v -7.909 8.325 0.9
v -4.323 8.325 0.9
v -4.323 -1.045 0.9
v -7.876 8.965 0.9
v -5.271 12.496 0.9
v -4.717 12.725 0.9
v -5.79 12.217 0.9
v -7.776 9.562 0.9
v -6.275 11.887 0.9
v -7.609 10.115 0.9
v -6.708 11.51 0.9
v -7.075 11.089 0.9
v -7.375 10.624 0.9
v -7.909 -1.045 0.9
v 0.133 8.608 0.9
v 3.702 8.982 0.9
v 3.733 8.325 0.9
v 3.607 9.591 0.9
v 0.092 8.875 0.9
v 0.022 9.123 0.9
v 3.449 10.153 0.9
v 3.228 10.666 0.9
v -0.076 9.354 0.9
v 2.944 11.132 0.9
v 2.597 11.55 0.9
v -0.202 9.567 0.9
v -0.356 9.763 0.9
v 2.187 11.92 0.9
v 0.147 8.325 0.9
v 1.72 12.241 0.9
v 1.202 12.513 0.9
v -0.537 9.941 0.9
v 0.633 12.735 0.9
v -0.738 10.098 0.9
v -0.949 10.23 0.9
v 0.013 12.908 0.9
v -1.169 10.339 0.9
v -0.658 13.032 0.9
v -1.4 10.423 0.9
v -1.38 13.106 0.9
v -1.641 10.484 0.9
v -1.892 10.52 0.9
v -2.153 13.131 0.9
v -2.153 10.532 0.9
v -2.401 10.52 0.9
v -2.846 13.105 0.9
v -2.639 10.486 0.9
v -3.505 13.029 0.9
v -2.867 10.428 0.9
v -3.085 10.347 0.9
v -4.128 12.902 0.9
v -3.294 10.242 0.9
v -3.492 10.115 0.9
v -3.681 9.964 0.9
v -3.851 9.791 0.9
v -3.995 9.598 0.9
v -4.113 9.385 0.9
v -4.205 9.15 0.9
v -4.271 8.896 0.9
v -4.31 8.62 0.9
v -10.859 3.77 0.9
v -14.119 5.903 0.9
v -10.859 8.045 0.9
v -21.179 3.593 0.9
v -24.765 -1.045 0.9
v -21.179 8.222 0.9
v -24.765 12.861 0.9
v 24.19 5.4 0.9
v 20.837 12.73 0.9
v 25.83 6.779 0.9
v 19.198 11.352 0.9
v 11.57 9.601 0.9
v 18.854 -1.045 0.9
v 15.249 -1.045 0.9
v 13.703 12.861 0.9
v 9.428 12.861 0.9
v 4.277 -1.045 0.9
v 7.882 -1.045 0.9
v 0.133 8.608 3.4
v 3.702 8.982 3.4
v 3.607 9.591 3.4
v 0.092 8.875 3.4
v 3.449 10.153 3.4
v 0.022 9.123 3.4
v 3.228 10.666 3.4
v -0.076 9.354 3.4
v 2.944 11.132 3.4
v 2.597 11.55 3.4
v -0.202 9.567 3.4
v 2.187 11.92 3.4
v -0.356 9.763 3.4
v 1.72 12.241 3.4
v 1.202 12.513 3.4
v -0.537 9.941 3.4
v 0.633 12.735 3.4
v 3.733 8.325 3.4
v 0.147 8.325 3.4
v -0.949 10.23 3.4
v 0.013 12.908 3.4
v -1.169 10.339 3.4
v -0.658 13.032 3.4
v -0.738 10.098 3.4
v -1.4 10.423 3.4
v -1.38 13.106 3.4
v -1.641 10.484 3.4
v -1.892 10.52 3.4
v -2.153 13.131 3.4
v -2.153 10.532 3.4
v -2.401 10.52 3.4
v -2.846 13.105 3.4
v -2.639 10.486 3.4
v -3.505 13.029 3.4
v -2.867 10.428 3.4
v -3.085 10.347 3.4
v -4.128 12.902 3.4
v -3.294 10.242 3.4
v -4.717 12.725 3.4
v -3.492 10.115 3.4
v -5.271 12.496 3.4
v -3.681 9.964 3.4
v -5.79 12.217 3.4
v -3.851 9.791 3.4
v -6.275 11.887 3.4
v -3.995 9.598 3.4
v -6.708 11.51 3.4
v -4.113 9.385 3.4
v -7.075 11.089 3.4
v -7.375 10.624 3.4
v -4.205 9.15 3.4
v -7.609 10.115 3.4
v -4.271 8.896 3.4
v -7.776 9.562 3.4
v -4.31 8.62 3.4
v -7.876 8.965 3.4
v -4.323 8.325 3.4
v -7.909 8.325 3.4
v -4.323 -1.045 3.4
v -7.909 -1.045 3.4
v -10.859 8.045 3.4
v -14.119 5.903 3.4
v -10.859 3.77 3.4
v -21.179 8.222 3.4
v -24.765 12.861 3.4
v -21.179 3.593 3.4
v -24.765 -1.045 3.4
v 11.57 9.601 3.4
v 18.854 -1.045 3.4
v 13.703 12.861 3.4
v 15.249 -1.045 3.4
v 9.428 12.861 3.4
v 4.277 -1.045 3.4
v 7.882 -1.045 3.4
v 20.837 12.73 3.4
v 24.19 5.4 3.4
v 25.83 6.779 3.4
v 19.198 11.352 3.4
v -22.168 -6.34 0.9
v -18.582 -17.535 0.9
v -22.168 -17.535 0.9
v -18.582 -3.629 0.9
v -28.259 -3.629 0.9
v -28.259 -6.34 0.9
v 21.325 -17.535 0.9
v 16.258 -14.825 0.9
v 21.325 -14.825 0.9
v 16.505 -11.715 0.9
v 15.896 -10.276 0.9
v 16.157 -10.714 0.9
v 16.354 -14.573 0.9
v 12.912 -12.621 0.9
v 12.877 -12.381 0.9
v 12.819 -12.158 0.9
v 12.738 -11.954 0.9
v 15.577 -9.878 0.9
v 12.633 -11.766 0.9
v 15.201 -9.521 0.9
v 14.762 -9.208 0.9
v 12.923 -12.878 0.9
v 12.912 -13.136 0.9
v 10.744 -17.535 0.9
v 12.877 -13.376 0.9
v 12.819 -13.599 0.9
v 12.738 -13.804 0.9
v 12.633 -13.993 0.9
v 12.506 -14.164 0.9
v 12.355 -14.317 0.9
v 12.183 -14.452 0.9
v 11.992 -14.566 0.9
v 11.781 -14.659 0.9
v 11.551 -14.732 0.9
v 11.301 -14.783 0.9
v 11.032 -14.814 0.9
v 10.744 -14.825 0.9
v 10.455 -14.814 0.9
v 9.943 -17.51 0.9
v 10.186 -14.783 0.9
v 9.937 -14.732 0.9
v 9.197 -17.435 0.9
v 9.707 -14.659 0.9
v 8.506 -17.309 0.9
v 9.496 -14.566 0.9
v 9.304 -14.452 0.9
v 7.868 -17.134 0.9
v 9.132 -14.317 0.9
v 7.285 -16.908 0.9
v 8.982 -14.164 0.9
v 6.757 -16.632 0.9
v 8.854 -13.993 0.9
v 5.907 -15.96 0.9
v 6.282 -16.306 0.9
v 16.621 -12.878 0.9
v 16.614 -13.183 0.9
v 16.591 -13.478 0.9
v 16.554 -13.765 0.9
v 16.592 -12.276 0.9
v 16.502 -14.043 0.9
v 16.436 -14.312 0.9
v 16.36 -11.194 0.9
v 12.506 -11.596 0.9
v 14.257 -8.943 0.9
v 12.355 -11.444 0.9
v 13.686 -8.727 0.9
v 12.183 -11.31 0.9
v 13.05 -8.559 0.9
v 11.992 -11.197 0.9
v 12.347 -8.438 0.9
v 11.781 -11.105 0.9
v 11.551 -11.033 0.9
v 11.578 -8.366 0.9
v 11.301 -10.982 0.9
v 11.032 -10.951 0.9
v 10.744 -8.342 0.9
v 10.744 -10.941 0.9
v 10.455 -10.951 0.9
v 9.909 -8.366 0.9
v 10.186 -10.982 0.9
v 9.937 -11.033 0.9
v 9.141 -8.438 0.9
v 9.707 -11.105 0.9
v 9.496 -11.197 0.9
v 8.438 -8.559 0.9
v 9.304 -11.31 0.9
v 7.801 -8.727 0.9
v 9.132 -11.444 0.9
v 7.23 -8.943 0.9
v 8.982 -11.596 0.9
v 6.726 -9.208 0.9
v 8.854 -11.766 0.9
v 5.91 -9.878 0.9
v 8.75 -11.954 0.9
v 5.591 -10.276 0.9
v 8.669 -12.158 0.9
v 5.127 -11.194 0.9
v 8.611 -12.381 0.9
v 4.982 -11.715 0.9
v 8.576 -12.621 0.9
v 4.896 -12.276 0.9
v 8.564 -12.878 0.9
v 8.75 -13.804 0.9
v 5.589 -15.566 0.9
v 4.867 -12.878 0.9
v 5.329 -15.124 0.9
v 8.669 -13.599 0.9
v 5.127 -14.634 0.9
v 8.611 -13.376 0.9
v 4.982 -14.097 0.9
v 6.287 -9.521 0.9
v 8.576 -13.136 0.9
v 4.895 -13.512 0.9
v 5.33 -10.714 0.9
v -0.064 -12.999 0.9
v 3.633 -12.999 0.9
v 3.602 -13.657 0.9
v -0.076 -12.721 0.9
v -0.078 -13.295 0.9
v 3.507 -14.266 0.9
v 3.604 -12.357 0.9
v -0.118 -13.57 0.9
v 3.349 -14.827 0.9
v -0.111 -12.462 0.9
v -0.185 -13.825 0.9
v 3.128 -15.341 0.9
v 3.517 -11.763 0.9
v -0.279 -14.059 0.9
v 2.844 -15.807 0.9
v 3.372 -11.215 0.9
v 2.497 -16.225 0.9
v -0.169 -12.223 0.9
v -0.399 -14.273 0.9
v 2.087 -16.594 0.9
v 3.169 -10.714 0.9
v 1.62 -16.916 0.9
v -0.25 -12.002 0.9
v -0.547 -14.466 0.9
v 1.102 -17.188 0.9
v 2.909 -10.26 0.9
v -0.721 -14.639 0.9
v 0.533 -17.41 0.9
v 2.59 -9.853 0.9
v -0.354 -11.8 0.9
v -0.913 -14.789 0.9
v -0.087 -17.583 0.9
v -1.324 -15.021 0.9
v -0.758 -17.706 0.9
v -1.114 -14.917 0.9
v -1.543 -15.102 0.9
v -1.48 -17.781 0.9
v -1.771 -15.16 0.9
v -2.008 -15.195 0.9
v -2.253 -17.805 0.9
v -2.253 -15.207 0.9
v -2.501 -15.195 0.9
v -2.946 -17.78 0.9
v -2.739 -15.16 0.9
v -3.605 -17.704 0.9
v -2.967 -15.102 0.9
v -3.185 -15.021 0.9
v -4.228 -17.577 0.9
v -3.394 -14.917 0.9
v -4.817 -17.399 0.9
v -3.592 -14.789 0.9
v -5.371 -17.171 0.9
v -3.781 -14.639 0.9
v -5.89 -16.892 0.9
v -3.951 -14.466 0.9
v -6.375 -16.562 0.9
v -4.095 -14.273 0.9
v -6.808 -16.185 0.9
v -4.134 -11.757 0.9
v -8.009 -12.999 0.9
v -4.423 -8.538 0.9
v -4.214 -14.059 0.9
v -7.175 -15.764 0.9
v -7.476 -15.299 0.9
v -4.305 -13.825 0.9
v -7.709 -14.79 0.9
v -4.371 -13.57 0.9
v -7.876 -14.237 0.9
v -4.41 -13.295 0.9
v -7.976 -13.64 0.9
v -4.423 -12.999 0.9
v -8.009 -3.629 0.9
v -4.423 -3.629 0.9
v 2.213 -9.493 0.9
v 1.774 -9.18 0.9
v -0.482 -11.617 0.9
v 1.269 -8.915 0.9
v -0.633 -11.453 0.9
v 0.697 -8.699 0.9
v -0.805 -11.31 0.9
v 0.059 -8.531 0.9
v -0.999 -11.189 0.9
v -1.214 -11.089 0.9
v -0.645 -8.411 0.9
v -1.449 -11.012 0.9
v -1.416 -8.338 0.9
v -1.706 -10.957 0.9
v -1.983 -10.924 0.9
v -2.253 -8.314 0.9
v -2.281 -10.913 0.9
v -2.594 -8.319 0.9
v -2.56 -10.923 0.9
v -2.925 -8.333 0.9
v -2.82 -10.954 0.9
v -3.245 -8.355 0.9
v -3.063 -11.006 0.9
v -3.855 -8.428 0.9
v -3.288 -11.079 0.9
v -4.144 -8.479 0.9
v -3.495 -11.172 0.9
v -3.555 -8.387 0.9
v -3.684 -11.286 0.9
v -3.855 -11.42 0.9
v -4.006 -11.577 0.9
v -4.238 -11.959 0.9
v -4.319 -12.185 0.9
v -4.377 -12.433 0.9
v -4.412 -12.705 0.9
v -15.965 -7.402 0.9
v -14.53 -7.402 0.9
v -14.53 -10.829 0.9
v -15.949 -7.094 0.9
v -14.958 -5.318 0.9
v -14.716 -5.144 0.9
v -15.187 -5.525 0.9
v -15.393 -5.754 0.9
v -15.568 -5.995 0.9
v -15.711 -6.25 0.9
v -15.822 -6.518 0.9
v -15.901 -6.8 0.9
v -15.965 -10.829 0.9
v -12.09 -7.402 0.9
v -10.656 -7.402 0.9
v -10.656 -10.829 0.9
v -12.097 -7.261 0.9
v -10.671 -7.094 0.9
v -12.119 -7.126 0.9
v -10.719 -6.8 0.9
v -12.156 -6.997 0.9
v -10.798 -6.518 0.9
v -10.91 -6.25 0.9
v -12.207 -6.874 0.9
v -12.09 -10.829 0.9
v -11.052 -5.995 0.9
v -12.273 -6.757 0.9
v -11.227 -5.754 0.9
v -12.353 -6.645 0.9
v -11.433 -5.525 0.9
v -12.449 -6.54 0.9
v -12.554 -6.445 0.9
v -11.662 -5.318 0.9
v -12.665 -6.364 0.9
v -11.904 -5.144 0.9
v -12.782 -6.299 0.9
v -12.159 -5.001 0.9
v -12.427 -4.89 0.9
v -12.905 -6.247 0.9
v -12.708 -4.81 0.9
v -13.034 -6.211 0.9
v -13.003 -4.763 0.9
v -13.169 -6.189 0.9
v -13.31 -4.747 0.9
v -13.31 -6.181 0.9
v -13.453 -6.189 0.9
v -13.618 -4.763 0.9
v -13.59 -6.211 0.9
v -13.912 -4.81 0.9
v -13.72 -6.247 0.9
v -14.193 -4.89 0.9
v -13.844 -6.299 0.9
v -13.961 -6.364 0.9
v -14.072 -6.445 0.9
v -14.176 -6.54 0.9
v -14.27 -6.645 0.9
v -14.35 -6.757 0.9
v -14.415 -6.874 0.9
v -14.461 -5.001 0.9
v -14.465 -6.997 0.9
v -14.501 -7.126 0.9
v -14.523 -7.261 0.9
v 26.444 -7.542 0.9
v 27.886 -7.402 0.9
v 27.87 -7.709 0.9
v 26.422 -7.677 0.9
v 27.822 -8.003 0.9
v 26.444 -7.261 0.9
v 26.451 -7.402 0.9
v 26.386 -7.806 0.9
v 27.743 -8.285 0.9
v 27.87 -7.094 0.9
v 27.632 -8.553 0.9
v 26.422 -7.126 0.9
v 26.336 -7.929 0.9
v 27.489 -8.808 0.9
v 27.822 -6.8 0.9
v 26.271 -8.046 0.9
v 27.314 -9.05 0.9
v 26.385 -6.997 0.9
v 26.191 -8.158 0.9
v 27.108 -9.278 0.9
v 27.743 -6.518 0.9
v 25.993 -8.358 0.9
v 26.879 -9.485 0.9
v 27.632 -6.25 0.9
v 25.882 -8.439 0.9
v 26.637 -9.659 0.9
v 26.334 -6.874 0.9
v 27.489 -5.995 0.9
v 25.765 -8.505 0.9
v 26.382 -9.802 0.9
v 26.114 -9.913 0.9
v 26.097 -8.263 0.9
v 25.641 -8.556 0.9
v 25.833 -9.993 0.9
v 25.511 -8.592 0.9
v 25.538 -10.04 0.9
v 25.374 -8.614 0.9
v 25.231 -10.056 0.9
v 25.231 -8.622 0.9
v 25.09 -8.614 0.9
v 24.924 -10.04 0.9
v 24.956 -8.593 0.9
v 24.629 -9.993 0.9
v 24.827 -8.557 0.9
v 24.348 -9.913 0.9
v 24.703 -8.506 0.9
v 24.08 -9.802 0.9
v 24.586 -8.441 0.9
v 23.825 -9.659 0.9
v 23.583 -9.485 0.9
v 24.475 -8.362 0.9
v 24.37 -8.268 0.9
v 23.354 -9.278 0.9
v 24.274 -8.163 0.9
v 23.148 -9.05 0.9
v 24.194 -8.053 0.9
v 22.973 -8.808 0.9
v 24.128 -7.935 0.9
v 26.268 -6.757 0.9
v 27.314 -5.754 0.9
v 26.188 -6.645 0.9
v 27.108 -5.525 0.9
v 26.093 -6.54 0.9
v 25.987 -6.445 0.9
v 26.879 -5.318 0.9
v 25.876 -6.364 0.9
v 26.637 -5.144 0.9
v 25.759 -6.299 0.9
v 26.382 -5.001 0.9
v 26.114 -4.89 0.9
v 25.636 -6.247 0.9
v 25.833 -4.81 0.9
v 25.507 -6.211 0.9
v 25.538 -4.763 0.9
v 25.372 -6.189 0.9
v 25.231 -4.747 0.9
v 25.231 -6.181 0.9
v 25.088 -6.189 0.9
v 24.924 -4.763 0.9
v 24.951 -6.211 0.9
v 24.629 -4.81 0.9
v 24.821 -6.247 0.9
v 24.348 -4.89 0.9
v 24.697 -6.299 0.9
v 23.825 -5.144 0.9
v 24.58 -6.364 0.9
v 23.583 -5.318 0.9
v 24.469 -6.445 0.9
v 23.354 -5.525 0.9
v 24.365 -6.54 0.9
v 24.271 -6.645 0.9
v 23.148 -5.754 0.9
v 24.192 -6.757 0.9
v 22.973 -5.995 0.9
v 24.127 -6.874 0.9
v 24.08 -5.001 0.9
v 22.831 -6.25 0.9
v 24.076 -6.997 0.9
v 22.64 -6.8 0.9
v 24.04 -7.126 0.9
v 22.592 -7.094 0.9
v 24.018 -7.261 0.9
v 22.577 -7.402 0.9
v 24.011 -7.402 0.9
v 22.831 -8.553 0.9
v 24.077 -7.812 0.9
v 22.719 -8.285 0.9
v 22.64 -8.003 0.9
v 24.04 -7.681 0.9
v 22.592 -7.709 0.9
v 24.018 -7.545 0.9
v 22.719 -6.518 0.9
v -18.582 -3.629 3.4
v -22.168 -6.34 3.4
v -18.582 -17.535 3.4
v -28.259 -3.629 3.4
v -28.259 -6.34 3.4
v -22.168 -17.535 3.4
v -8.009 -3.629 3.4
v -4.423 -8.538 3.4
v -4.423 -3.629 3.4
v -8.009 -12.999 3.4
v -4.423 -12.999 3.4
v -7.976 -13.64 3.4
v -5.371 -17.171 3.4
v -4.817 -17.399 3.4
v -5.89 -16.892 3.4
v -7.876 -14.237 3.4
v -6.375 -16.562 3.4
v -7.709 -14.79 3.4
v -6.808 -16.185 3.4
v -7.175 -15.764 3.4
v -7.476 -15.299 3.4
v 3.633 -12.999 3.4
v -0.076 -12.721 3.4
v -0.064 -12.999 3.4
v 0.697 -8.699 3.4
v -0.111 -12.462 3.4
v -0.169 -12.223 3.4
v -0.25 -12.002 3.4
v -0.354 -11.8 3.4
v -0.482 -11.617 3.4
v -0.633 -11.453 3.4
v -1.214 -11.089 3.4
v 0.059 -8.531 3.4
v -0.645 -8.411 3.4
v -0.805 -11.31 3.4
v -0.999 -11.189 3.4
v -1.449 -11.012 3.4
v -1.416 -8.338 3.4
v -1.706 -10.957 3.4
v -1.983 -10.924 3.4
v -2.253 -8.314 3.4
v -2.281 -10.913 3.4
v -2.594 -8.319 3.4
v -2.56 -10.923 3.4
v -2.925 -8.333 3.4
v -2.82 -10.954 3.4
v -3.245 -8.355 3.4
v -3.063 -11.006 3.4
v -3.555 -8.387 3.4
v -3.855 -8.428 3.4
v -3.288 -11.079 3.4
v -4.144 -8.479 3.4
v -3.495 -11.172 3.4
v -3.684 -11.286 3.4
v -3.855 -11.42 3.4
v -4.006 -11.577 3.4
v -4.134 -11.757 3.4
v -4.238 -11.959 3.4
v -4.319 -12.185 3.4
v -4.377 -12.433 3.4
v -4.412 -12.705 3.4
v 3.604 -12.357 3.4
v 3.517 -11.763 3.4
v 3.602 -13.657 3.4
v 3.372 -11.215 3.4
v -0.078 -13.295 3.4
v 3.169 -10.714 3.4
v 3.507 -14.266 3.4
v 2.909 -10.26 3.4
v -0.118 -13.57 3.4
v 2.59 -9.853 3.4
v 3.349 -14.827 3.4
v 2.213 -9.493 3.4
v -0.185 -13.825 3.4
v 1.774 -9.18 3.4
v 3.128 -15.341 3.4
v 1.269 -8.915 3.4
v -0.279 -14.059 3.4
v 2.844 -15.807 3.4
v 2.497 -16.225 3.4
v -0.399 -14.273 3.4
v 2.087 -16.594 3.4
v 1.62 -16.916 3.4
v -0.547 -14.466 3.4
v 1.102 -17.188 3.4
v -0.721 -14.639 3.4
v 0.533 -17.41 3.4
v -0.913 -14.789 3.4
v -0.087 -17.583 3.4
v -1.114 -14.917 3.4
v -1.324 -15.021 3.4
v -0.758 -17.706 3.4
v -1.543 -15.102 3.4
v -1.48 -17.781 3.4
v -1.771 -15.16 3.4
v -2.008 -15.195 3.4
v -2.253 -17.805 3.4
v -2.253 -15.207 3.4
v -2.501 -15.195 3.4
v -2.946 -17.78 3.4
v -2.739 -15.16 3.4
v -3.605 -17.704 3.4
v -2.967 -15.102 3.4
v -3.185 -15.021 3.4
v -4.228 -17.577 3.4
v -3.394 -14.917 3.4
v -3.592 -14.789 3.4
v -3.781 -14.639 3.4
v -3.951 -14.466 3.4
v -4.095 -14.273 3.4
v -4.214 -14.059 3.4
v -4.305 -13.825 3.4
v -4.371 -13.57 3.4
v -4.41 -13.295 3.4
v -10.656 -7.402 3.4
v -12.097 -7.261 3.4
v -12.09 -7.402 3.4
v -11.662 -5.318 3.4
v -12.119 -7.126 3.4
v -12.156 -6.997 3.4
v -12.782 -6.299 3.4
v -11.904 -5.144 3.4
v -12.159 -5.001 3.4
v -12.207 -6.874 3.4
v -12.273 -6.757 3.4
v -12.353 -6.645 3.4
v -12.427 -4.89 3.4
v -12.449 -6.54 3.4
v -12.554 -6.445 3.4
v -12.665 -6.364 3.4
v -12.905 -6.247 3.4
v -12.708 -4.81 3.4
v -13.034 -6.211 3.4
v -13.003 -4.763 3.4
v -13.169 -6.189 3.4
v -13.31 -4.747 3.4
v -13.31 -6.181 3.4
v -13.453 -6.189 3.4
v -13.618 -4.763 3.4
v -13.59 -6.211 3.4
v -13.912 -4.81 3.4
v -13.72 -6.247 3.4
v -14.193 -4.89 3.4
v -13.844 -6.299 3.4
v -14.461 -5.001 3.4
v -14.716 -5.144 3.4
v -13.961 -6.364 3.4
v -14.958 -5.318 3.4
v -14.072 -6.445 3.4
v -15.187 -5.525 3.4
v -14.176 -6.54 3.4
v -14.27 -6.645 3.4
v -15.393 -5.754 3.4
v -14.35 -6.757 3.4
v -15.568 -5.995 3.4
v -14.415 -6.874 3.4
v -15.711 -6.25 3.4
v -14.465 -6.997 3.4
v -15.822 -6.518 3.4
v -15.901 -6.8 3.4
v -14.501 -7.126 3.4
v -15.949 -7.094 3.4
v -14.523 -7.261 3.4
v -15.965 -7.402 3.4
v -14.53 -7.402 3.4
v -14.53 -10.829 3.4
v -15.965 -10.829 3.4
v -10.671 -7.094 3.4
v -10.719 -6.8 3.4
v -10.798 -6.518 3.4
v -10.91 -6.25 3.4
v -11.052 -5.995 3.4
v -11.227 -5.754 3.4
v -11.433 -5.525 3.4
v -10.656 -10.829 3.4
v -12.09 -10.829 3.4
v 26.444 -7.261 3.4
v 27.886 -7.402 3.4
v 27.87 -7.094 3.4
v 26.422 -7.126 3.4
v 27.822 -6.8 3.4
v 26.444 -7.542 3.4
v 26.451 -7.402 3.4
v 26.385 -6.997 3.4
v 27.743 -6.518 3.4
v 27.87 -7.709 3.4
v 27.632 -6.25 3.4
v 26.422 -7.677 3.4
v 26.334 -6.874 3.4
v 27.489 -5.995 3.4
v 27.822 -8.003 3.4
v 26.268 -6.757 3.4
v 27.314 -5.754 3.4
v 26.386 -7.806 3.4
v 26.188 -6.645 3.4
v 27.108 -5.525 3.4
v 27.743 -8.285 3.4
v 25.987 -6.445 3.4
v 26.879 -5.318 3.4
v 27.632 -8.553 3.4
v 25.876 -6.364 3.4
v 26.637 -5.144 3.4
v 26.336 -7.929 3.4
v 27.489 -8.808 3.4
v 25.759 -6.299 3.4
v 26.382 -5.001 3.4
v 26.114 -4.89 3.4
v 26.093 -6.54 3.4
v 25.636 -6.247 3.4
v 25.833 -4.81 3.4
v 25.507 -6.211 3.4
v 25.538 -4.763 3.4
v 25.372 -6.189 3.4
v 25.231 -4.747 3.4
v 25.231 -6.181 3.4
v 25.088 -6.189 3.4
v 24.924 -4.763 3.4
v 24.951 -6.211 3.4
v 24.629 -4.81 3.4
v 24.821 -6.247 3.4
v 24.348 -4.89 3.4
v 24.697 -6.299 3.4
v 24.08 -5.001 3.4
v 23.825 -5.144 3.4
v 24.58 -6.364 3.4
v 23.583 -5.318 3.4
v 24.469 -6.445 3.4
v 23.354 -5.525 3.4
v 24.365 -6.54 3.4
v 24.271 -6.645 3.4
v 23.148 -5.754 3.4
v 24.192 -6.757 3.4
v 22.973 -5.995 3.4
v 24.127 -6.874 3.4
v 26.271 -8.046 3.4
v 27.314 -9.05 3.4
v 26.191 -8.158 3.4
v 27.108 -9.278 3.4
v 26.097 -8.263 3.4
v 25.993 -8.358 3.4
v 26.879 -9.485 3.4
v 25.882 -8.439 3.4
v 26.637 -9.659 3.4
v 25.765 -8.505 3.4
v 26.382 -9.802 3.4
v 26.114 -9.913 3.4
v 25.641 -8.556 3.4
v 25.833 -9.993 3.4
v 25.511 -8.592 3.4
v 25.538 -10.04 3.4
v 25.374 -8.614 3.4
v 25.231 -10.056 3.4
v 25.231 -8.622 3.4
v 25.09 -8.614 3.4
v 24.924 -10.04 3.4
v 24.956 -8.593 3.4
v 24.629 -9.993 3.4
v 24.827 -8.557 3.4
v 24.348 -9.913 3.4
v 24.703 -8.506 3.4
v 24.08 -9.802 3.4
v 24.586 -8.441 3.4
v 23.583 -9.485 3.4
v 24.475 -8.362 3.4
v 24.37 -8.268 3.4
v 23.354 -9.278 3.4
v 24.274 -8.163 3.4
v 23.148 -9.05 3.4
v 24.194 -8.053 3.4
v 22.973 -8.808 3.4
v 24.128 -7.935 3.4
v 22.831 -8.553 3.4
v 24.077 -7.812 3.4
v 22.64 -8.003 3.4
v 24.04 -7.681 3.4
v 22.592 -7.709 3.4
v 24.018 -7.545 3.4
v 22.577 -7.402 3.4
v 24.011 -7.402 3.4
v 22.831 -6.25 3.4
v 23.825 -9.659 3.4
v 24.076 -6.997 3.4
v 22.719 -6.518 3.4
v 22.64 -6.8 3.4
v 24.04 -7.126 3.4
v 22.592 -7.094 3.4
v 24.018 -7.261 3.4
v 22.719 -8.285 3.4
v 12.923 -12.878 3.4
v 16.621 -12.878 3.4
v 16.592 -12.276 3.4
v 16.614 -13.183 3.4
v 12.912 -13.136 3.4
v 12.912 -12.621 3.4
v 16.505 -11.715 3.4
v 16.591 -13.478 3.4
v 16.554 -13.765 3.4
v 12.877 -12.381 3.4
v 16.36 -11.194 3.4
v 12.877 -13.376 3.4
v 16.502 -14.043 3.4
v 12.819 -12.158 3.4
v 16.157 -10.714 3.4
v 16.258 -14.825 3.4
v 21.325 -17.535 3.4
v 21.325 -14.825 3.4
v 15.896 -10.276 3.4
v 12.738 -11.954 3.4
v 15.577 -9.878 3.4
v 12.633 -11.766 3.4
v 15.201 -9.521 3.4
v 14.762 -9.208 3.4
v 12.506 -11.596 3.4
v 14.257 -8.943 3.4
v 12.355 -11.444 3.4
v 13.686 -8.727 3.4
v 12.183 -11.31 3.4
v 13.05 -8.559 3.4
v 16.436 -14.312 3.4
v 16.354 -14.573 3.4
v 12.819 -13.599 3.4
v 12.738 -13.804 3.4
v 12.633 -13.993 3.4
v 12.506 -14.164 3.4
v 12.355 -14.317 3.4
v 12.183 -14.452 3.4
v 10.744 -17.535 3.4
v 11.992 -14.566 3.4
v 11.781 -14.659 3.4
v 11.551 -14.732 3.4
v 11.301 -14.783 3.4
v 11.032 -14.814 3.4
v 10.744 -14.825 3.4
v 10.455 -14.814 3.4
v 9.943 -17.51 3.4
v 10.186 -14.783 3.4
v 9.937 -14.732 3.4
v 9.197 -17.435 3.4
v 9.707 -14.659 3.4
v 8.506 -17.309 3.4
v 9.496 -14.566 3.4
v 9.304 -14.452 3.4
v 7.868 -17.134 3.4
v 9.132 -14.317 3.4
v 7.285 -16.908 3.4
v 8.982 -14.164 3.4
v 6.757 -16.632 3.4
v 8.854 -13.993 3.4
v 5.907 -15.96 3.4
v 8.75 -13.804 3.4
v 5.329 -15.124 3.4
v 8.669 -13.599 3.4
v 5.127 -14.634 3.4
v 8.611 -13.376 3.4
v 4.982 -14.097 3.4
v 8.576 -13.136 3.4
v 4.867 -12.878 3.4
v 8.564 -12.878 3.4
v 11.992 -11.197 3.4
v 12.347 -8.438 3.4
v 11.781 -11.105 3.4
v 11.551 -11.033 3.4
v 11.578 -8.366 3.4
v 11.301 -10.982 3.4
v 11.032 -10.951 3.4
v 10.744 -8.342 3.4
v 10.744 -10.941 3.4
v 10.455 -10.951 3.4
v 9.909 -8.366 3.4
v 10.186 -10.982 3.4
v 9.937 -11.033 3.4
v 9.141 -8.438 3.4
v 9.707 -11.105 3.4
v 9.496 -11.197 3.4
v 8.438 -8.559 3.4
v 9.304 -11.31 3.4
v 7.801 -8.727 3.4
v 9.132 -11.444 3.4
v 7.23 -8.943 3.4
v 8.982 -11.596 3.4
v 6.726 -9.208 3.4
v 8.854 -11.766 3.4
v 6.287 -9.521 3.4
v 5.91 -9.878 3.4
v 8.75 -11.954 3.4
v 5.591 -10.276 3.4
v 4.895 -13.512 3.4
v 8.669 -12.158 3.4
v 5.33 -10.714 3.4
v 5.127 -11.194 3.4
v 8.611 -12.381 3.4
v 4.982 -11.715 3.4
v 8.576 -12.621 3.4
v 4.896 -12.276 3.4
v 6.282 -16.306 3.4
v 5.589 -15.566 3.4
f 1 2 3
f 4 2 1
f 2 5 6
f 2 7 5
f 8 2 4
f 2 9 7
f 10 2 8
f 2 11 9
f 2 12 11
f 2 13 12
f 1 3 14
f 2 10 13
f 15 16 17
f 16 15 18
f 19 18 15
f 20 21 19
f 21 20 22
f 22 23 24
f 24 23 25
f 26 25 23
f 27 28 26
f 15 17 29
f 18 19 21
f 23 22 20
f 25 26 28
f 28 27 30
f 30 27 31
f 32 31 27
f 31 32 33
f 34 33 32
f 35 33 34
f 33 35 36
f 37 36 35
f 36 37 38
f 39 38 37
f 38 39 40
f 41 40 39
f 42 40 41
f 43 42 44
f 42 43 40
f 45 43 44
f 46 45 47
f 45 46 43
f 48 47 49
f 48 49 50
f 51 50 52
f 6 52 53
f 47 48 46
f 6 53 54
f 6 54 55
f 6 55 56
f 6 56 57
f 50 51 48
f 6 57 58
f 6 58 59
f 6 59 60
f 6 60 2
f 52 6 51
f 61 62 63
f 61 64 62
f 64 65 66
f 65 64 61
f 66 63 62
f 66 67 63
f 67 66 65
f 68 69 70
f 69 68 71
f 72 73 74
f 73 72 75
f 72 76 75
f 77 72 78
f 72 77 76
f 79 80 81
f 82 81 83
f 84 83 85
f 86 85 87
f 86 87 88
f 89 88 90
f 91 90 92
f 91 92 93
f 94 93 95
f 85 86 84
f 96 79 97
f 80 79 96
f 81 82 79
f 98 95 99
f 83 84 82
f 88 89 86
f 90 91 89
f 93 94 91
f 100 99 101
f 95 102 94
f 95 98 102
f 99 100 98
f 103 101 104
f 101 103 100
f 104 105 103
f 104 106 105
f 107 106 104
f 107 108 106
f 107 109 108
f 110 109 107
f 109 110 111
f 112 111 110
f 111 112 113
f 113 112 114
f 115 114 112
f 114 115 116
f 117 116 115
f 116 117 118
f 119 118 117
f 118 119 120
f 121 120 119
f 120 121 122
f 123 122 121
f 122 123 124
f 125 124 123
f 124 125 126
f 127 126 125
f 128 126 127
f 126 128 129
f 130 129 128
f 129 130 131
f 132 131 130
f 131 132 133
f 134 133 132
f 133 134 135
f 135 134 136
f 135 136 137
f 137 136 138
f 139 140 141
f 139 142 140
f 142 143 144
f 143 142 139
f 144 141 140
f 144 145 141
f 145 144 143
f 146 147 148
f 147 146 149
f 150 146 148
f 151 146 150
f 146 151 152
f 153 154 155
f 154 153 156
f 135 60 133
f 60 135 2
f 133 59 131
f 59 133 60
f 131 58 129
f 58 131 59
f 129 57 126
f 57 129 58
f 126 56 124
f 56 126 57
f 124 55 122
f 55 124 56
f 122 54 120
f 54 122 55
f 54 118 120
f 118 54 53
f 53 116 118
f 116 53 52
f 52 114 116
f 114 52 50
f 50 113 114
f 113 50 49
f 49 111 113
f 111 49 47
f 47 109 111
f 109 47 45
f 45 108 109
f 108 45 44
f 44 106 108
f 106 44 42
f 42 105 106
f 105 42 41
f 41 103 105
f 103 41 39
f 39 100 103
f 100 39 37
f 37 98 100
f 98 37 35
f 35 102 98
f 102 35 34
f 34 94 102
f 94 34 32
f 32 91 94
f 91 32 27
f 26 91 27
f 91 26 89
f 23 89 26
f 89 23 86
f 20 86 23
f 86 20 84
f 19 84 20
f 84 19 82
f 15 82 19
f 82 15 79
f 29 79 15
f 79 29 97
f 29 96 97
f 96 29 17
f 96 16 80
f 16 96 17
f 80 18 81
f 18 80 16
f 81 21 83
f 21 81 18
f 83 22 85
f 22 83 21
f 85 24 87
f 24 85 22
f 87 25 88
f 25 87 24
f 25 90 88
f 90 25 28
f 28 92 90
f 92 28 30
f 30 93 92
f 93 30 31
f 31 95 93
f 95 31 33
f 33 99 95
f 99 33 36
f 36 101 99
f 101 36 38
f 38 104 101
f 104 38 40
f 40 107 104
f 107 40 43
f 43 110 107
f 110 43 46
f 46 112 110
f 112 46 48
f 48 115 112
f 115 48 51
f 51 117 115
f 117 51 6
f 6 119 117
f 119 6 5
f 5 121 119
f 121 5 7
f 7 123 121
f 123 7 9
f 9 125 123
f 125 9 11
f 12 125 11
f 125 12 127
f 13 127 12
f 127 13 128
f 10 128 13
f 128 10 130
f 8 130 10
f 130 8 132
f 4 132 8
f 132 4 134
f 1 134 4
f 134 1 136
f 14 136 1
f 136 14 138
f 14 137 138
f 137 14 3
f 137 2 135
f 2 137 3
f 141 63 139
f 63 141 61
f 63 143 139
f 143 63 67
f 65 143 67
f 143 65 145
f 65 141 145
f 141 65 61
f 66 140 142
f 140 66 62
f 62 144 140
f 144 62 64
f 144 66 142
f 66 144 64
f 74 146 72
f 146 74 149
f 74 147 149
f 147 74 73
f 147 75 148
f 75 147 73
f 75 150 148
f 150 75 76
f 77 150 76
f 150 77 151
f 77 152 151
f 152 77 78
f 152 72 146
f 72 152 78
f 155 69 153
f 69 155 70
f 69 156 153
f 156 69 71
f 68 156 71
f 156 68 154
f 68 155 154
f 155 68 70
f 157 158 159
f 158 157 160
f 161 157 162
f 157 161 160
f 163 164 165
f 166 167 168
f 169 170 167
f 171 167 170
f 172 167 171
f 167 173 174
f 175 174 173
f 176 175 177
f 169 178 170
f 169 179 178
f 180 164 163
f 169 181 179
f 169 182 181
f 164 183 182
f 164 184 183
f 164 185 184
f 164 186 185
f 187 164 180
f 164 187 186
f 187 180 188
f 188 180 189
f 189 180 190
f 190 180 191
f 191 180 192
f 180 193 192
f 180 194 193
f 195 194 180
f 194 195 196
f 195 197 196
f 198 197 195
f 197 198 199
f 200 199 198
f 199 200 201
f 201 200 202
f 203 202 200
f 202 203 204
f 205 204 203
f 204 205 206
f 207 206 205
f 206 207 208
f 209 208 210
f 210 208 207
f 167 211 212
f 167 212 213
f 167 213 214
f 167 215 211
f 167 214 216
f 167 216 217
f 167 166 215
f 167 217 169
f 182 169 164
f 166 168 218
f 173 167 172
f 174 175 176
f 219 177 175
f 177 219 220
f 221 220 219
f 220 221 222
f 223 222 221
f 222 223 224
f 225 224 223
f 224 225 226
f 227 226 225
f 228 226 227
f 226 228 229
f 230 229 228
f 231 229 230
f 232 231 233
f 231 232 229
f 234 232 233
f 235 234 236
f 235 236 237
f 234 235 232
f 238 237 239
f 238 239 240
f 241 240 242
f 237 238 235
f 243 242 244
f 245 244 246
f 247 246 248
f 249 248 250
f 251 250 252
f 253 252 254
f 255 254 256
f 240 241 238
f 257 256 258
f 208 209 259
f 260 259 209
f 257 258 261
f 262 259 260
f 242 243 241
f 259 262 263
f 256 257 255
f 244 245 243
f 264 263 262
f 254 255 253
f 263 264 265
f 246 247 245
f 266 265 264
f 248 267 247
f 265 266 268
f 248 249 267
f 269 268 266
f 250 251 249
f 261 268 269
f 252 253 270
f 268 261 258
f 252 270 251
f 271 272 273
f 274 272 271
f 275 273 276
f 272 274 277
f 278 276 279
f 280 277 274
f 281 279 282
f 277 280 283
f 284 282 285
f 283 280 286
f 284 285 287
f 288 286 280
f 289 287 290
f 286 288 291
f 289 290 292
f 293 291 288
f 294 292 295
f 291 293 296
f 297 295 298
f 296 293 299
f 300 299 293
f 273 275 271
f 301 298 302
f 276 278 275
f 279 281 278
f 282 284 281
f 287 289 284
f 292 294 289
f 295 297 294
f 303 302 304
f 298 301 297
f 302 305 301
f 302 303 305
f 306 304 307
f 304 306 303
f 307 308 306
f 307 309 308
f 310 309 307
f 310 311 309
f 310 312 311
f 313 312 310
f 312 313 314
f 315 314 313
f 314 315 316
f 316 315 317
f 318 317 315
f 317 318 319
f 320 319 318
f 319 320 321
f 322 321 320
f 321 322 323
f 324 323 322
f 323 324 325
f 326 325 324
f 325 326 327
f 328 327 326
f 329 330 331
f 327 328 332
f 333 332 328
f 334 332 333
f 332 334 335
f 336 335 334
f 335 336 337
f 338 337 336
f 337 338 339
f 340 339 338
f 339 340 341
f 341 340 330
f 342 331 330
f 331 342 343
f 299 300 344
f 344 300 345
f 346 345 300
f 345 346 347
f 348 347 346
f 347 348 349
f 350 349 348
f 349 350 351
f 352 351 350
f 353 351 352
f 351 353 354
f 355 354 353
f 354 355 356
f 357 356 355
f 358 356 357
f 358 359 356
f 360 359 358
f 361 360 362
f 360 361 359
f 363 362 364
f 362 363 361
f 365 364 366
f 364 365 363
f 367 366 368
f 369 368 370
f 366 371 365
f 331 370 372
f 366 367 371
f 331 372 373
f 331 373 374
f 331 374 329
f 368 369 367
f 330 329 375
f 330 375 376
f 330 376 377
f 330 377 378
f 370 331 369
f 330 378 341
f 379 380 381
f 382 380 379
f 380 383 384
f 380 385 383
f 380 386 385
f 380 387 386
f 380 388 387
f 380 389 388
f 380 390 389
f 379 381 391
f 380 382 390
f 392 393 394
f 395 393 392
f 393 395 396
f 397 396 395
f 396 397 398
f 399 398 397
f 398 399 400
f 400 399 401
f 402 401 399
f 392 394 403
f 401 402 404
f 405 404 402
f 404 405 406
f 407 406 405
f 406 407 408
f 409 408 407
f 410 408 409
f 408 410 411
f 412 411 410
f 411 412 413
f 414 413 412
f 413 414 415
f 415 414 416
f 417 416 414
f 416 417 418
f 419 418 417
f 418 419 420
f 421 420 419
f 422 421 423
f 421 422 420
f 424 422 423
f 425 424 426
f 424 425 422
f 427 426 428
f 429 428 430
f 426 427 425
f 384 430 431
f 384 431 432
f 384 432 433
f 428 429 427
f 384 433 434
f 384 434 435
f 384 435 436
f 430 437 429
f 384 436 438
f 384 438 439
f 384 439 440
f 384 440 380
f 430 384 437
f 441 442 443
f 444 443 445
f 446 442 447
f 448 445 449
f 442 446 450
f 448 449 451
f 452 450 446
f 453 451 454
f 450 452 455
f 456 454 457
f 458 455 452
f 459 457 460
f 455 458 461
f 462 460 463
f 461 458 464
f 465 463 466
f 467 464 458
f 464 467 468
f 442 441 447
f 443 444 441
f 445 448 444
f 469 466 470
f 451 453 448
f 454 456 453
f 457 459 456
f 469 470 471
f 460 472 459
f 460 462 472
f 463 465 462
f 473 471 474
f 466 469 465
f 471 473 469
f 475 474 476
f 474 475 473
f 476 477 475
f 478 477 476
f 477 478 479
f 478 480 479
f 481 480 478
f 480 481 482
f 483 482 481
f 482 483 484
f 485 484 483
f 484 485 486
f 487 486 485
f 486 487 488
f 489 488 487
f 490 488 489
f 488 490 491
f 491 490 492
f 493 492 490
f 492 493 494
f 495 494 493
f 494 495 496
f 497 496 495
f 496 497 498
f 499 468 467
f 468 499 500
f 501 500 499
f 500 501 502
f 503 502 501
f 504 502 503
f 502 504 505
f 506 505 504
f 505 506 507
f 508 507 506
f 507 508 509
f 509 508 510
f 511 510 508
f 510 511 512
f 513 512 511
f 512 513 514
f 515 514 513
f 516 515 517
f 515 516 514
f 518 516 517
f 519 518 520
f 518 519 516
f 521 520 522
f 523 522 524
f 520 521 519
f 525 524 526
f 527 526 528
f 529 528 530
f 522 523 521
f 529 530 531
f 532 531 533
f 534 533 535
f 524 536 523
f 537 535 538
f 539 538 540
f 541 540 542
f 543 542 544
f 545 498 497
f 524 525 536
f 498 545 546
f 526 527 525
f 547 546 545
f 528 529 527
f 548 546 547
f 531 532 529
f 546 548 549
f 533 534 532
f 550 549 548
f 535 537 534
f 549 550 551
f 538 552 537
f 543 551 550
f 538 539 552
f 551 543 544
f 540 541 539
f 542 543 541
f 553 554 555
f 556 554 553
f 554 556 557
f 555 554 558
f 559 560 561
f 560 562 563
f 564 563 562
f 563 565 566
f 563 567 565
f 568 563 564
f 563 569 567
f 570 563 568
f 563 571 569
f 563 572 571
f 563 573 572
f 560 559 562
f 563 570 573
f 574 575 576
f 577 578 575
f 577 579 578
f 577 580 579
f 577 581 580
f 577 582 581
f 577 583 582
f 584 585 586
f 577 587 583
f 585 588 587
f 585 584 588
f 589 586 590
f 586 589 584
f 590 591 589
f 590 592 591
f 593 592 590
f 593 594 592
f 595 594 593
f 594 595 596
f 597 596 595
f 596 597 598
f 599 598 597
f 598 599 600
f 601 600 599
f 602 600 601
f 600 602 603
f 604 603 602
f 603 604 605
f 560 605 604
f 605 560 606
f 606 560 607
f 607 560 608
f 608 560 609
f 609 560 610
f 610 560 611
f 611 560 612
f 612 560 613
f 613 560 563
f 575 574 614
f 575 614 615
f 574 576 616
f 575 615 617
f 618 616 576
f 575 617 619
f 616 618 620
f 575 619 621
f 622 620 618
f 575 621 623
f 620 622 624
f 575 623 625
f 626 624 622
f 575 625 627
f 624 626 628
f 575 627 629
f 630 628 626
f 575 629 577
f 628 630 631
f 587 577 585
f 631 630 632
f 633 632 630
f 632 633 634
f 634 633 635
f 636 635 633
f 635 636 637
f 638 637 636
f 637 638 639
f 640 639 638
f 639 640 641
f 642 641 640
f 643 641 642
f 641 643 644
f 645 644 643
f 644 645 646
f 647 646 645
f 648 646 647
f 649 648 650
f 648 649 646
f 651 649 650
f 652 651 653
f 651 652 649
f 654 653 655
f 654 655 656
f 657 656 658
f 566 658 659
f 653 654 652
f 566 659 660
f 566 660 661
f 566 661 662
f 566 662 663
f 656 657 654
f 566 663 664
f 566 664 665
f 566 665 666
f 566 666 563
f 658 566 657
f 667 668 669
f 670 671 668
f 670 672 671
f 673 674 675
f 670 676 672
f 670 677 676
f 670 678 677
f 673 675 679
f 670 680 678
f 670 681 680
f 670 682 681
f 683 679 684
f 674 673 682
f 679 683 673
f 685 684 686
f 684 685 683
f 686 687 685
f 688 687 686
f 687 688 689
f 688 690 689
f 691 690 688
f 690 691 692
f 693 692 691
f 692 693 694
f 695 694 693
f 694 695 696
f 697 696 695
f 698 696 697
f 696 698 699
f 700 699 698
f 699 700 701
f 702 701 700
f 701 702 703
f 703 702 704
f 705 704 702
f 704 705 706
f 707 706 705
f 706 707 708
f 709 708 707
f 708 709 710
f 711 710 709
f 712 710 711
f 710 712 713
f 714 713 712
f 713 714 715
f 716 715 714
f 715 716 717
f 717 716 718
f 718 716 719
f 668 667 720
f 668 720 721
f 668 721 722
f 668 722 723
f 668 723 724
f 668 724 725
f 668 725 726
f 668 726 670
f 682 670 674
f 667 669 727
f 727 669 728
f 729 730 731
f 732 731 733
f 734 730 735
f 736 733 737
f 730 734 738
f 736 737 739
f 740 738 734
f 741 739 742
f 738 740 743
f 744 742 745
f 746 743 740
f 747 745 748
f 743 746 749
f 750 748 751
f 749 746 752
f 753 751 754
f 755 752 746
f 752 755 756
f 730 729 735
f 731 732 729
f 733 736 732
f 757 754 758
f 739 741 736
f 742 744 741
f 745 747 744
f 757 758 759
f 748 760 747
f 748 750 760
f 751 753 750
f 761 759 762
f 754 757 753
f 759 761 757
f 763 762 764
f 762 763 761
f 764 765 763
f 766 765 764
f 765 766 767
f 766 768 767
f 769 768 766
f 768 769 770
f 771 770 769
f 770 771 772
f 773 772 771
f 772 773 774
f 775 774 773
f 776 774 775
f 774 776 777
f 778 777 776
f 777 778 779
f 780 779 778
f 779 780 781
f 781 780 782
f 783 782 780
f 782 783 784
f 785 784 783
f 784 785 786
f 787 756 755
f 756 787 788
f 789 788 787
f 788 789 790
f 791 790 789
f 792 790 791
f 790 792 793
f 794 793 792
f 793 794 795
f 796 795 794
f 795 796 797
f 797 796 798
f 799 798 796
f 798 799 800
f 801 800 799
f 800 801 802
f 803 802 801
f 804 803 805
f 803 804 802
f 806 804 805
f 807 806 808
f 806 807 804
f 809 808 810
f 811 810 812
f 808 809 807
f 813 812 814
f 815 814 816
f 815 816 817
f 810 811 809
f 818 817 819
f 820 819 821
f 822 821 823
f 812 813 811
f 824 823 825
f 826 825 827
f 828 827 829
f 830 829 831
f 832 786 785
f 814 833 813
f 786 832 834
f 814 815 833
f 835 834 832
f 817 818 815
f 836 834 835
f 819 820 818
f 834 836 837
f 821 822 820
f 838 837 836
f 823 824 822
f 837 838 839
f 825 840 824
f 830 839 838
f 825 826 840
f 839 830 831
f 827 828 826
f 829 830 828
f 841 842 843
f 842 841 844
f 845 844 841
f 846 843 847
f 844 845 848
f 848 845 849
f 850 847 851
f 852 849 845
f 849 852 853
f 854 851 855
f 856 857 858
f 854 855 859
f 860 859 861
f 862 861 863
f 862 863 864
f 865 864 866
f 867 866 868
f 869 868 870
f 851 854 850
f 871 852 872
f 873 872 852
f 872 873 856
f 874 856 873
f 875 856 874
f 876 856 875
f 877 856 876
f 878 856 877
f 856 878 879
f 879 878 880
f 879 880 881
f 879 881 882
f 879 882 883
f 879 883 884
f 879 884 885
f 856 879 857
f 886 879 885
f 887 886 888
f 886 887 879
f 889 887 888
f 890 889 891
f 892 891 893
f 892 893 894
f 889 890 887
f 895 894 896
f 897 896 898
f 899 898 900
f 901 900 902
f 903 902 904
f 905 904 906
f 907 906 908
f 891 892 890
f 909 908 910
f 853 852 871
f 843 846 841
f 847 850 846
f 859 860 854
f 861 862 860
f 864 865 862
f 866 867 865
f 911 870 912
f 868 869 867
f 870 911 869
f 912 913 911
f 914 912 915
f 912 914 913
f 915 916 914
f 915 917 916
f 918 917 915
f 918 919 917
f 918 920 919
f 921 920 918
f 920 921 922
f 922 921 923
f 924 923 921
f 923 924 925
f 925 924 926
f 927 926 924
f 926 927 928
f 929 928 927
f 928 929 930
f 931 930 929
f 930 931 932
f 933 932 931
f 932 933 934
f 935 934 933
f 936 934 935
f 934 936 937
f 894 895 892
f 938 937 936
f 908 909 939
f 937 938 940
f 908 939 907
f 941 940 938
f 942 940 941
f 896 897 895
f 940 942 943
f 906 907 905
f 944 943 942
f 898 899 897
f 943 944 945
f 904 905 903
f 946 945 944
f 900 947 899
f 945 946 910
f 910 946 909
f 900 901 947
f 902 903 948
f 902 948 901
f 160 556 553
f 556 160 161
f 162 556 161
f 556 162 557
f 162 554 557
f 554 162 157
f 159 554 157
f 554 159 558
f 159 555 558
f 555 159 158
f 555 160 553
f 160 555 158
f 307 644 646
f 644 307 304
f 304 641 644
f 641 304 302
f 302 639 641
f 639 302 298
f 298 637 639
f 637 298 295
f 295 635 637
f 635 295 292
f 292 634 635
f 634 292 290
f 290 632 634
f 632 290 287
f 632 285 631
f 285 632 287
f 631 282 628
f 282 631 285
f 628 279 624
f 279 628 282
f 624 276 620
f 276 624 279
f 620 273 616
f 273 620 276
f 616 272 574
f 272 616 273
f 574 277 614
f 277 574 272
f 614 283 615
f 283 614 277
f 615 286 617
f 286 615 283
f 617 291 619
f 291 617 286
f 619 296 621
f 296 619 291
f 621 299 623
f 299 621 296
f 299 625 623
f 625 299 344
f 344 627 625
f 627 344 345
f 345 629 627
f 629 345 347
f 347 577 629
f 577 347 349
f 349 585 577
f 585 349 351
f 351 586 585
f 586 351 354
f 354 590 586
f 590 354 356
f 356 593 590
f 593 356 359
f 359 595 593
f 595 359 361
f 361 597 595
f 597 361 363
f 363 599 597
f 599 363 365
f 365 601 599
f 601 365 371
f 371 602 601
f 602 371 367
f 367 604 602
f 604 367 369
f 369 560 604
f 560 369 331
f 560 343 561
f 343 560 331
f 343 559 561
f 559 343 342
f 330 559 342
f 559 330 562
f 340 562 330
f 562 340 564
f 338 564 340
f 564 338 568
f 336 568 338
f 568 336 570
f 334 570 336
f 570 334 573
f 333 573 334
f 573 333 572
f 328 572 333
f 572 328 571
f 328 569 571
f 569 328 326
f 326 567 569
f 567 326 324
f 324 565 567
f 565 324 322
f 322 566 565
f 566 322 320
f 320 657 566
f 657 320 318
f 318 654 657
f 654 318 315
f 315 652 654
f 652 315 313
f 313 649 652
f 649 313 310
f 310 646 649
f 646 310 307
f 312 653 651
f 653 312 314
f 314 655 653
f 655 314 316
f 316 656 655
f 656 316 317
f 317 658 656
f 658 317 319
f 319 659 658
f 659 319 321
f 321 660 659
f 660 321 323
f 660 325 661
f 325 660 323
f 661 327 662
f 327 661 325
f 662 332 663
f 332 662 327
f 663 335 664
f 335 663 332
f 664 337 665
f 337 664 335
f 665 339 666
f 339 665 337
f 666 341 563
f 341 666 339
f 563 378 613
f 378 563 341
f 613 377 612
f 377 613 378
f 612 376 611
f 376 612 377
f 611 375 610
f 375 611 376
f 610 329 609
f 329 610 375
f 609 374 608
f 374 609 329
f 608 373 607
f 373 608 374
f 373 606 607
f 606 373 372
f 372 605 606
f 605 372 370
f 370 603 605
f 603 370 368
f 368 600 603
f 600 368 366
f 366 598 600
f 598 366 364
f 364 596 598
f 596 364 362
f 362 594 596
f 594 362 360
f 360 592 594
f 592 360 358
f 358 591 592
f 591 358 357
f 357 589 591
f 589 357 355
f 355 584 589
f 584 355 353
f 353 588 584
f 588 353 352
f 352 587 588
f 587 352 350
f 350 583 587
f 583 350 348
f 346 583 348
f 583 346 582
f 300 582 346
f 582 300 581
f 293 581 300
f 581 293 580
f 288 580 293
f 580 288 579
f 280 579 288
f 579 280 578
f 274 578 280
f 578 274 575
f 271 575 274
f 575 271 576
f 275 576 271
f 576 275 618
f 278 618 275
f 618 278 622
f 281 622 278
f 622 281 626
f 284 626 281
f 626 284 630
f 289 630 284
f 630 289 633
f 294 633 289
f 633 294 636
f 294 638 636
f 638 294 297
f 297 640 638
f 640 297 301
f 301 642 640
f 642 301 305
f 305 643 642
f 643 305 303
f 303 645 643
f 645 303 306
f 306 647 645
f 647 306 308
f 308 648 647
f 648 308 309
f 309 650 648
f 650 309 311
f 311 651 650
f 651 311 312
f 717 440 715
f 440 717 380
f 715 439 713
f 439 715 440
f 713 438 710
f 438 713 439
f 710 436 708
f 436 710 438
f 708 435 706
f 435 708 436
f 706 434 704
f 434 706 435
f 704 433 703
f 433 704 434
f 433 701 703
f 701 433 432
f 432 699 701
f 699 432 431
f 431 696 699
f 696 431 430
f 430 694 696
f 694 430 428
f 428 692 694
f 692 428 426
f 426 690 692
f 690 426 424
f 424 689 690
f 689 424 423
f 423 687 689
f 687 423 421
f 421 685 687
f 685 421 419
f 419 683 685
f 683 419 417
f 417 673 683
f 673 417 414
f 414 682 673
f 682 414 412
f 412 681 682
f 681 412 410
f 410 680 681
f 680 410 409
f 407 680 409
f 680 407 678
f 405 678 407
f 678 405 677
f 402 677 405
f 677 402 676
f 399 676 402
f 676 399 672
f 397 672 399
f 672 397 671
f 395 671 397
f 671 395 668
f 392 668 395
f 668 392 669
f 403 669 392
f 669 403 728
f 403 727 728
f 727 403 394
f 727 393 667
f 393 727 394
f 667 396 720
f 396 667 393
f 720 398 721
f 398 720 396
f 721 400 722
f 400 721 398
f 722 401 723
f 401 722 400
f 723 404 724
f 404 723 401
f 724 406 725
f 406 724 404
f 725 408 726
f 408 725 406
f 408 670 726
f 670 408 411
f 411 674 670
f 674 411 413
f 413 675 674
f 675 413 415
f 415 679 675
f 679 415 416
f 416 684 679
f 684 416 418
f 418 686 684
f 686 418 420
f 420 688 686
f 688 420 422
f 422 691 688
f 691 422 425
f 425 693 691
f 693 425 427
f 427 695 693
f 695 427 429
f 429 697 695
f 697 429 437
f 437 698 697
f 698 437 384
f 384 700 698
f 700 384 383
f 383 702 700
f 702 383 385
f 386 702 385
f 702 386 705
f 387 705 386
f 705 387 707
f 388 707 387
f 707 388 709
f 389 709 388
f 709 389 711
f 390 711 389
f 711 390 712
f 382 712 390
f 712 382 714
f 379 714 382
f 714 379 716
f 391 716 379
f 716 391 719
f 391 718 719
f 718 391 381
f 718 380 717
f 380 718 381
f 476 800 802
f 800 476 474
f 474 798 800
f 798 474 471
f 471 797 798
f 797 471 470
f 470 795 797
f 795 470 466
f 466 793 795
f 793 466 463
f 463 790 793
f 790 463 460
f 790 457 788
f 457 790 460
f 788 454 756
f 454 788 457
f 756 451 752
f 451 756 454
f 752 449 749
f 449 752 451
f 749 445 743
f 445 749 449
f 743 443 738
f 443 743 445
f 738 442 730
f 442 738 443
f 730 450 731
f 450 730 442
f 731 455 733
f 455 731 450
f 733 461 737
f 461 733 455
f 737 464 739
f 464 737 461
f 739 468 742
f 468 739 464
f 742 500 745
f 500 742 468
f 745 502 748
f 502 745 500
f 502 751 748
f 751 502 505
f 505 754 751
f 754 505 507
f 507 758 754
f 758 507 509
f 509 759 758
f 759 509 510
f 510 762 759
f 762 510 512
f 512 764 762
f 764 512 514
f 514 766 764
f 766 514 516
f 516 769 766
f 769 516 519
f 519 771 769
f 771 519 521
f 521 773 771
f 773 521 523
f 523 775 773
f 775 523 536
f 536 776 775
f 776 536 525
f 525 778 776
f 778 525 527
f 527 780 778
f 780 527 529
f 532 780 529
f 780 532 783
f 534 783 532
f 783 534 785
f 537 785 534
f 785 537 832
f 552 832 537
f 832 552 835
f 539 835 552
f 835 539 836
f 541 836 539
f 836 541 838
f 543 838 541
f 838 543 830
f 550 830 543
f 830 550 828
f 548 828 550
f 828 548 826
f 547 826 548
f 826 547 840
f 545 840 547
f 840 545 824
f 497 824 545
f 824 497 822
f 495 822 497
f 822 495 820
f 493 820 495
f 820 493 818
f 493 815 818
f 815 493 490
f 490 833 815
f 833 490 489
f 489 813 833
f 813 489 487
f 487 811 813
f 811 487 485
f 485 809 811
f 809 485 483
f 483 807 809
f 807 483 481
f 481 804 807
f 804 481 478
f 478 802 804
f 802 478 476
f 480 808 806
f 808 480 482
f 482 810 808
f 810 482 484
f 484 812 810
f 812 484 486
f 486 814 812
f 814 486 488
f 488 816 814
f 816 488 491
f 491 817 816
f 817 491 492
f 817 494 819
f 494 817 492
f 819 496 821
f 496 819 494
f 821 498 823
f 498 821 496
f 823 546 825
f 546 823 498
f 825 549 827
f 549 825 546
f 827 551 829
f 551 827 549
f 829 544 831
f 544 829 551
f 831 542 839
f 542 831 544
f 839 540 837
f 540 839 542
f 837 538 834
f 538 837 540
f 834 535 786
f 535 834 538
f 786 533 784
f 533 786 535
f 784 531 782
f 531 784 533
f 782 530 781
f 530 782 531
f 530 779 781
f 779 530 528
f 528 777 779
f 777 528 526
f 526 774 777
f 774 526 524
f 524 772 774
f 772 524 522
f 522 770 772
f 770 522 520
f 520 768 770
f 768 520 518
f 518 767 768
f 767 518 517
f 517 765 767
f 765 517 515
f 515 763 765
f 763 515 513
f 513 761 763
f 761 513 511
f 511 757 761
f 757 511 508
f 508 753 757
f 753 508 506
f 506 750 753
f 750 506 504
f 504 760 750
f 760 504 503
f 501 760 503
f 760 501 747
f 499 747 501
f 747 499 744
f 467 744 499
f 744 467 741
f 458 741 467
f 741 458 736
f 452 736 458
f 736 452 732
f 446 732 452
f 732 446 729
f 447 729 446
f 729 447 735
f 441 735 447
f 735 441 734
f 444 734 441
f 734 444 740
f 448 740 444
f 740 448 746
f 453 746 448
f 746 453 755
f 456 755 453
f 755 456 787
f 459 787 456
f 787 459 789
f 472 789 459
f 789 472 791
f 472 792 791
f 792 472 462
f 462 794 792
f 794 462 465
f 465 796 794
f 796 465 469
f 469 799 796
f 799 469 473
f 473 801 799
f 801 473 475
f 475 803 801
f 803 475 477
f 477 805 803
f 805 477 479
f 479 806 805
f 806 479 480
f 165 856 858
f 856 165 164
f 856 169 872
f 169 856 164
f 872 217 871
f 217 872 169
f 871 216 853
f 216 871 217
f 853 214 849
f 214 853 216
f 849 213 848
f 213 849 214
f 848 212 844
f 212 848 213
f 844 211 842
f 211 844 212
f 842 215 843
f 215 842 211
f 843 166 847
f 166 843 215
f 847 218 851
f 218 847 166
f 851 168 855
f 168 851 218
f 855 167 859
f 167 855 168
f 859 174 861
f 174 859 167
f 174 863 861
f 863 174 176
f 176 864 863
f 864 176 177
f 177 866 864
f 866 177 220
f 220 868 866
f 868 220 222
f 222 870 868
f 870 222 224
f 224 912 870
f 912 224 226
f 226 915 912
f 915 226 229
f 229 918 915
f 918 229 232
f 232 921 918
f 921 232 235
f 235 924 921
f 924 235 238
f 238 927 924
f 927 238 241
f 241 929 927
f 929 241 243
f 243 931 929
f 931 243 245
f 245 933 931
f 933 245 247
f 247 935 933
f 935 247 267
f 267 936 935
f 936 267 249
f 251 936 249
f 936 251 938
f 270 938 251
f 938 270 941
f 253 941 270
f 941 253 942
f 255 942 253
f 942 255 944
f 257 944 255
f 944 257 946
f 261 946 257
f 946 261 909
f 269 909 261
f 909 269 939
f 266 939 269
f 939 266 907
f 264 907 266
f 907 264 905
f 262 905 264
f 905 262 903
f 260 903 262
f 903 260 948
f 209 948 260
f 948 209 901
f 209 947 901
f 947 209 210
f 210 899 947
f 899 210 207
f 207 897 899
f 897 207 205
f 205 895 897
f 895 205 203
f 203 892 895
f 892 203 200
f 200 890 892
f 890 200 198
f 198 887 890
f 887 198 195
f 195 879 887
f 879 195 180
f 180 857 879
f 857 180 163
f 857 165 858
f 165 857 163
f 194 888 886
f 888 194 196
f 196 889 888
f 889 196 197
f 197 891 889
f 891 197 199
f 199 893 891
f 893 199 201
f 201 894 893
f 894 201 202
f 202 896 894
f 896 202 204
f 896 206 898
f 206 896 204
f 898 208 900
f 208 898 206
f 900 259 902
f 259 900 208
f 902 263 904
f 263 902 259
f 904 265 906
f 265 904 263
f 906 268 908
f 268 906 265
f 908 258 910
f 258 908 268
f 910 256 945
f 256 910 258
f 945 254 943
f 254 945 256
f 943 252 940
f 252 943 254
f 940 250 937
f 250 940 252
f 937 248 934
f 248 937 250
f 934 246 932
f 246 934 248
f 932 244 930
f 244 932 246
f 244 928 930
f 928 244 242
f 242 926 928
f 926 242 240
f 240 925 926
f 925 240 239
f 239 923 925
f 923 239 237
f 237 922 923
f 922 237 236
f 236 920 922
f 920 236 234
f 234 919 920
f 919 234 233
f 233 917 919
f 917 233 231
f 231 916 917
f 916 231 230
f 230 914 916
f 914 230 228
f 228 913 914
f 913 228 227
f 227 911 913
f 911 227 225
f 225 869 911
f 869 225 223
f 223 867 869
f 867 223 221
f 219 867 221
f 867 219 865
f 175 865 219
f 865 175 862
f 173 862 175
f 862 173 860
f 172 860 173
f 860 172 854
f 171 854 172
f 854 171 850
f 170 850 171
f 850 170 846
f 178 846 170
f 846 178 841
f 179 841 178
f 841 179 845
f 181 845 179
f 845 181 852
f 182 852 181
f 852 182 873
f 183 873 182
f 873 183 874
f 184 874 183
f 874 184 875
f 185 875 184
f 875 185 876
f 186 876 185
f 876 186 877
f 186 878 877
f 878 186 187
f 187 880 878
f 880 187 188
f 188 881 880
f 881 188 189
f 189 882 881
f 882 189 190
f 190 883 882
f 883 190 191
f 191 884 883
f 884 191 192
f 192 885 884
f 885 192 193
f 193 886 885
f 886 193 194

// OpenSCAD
$fn = 48;
  // syllabics (overlaid on icon, tallest)
  translate([0, 5.878, 0.900]) linear_extrude(height=2.500) text("ᐅᒋᐱᐠ", size=13.735, halign="center", valign="center", font="Euphemia UCAS:style=Bold");
  translate([0, -10.878, 0.900]) linear_extrude(height=2.500) text("ᒣᐢᑲᓇᐤ", size=13.735, halign="center", valign="center", font="Euphemia UCAS:style=Bold");
